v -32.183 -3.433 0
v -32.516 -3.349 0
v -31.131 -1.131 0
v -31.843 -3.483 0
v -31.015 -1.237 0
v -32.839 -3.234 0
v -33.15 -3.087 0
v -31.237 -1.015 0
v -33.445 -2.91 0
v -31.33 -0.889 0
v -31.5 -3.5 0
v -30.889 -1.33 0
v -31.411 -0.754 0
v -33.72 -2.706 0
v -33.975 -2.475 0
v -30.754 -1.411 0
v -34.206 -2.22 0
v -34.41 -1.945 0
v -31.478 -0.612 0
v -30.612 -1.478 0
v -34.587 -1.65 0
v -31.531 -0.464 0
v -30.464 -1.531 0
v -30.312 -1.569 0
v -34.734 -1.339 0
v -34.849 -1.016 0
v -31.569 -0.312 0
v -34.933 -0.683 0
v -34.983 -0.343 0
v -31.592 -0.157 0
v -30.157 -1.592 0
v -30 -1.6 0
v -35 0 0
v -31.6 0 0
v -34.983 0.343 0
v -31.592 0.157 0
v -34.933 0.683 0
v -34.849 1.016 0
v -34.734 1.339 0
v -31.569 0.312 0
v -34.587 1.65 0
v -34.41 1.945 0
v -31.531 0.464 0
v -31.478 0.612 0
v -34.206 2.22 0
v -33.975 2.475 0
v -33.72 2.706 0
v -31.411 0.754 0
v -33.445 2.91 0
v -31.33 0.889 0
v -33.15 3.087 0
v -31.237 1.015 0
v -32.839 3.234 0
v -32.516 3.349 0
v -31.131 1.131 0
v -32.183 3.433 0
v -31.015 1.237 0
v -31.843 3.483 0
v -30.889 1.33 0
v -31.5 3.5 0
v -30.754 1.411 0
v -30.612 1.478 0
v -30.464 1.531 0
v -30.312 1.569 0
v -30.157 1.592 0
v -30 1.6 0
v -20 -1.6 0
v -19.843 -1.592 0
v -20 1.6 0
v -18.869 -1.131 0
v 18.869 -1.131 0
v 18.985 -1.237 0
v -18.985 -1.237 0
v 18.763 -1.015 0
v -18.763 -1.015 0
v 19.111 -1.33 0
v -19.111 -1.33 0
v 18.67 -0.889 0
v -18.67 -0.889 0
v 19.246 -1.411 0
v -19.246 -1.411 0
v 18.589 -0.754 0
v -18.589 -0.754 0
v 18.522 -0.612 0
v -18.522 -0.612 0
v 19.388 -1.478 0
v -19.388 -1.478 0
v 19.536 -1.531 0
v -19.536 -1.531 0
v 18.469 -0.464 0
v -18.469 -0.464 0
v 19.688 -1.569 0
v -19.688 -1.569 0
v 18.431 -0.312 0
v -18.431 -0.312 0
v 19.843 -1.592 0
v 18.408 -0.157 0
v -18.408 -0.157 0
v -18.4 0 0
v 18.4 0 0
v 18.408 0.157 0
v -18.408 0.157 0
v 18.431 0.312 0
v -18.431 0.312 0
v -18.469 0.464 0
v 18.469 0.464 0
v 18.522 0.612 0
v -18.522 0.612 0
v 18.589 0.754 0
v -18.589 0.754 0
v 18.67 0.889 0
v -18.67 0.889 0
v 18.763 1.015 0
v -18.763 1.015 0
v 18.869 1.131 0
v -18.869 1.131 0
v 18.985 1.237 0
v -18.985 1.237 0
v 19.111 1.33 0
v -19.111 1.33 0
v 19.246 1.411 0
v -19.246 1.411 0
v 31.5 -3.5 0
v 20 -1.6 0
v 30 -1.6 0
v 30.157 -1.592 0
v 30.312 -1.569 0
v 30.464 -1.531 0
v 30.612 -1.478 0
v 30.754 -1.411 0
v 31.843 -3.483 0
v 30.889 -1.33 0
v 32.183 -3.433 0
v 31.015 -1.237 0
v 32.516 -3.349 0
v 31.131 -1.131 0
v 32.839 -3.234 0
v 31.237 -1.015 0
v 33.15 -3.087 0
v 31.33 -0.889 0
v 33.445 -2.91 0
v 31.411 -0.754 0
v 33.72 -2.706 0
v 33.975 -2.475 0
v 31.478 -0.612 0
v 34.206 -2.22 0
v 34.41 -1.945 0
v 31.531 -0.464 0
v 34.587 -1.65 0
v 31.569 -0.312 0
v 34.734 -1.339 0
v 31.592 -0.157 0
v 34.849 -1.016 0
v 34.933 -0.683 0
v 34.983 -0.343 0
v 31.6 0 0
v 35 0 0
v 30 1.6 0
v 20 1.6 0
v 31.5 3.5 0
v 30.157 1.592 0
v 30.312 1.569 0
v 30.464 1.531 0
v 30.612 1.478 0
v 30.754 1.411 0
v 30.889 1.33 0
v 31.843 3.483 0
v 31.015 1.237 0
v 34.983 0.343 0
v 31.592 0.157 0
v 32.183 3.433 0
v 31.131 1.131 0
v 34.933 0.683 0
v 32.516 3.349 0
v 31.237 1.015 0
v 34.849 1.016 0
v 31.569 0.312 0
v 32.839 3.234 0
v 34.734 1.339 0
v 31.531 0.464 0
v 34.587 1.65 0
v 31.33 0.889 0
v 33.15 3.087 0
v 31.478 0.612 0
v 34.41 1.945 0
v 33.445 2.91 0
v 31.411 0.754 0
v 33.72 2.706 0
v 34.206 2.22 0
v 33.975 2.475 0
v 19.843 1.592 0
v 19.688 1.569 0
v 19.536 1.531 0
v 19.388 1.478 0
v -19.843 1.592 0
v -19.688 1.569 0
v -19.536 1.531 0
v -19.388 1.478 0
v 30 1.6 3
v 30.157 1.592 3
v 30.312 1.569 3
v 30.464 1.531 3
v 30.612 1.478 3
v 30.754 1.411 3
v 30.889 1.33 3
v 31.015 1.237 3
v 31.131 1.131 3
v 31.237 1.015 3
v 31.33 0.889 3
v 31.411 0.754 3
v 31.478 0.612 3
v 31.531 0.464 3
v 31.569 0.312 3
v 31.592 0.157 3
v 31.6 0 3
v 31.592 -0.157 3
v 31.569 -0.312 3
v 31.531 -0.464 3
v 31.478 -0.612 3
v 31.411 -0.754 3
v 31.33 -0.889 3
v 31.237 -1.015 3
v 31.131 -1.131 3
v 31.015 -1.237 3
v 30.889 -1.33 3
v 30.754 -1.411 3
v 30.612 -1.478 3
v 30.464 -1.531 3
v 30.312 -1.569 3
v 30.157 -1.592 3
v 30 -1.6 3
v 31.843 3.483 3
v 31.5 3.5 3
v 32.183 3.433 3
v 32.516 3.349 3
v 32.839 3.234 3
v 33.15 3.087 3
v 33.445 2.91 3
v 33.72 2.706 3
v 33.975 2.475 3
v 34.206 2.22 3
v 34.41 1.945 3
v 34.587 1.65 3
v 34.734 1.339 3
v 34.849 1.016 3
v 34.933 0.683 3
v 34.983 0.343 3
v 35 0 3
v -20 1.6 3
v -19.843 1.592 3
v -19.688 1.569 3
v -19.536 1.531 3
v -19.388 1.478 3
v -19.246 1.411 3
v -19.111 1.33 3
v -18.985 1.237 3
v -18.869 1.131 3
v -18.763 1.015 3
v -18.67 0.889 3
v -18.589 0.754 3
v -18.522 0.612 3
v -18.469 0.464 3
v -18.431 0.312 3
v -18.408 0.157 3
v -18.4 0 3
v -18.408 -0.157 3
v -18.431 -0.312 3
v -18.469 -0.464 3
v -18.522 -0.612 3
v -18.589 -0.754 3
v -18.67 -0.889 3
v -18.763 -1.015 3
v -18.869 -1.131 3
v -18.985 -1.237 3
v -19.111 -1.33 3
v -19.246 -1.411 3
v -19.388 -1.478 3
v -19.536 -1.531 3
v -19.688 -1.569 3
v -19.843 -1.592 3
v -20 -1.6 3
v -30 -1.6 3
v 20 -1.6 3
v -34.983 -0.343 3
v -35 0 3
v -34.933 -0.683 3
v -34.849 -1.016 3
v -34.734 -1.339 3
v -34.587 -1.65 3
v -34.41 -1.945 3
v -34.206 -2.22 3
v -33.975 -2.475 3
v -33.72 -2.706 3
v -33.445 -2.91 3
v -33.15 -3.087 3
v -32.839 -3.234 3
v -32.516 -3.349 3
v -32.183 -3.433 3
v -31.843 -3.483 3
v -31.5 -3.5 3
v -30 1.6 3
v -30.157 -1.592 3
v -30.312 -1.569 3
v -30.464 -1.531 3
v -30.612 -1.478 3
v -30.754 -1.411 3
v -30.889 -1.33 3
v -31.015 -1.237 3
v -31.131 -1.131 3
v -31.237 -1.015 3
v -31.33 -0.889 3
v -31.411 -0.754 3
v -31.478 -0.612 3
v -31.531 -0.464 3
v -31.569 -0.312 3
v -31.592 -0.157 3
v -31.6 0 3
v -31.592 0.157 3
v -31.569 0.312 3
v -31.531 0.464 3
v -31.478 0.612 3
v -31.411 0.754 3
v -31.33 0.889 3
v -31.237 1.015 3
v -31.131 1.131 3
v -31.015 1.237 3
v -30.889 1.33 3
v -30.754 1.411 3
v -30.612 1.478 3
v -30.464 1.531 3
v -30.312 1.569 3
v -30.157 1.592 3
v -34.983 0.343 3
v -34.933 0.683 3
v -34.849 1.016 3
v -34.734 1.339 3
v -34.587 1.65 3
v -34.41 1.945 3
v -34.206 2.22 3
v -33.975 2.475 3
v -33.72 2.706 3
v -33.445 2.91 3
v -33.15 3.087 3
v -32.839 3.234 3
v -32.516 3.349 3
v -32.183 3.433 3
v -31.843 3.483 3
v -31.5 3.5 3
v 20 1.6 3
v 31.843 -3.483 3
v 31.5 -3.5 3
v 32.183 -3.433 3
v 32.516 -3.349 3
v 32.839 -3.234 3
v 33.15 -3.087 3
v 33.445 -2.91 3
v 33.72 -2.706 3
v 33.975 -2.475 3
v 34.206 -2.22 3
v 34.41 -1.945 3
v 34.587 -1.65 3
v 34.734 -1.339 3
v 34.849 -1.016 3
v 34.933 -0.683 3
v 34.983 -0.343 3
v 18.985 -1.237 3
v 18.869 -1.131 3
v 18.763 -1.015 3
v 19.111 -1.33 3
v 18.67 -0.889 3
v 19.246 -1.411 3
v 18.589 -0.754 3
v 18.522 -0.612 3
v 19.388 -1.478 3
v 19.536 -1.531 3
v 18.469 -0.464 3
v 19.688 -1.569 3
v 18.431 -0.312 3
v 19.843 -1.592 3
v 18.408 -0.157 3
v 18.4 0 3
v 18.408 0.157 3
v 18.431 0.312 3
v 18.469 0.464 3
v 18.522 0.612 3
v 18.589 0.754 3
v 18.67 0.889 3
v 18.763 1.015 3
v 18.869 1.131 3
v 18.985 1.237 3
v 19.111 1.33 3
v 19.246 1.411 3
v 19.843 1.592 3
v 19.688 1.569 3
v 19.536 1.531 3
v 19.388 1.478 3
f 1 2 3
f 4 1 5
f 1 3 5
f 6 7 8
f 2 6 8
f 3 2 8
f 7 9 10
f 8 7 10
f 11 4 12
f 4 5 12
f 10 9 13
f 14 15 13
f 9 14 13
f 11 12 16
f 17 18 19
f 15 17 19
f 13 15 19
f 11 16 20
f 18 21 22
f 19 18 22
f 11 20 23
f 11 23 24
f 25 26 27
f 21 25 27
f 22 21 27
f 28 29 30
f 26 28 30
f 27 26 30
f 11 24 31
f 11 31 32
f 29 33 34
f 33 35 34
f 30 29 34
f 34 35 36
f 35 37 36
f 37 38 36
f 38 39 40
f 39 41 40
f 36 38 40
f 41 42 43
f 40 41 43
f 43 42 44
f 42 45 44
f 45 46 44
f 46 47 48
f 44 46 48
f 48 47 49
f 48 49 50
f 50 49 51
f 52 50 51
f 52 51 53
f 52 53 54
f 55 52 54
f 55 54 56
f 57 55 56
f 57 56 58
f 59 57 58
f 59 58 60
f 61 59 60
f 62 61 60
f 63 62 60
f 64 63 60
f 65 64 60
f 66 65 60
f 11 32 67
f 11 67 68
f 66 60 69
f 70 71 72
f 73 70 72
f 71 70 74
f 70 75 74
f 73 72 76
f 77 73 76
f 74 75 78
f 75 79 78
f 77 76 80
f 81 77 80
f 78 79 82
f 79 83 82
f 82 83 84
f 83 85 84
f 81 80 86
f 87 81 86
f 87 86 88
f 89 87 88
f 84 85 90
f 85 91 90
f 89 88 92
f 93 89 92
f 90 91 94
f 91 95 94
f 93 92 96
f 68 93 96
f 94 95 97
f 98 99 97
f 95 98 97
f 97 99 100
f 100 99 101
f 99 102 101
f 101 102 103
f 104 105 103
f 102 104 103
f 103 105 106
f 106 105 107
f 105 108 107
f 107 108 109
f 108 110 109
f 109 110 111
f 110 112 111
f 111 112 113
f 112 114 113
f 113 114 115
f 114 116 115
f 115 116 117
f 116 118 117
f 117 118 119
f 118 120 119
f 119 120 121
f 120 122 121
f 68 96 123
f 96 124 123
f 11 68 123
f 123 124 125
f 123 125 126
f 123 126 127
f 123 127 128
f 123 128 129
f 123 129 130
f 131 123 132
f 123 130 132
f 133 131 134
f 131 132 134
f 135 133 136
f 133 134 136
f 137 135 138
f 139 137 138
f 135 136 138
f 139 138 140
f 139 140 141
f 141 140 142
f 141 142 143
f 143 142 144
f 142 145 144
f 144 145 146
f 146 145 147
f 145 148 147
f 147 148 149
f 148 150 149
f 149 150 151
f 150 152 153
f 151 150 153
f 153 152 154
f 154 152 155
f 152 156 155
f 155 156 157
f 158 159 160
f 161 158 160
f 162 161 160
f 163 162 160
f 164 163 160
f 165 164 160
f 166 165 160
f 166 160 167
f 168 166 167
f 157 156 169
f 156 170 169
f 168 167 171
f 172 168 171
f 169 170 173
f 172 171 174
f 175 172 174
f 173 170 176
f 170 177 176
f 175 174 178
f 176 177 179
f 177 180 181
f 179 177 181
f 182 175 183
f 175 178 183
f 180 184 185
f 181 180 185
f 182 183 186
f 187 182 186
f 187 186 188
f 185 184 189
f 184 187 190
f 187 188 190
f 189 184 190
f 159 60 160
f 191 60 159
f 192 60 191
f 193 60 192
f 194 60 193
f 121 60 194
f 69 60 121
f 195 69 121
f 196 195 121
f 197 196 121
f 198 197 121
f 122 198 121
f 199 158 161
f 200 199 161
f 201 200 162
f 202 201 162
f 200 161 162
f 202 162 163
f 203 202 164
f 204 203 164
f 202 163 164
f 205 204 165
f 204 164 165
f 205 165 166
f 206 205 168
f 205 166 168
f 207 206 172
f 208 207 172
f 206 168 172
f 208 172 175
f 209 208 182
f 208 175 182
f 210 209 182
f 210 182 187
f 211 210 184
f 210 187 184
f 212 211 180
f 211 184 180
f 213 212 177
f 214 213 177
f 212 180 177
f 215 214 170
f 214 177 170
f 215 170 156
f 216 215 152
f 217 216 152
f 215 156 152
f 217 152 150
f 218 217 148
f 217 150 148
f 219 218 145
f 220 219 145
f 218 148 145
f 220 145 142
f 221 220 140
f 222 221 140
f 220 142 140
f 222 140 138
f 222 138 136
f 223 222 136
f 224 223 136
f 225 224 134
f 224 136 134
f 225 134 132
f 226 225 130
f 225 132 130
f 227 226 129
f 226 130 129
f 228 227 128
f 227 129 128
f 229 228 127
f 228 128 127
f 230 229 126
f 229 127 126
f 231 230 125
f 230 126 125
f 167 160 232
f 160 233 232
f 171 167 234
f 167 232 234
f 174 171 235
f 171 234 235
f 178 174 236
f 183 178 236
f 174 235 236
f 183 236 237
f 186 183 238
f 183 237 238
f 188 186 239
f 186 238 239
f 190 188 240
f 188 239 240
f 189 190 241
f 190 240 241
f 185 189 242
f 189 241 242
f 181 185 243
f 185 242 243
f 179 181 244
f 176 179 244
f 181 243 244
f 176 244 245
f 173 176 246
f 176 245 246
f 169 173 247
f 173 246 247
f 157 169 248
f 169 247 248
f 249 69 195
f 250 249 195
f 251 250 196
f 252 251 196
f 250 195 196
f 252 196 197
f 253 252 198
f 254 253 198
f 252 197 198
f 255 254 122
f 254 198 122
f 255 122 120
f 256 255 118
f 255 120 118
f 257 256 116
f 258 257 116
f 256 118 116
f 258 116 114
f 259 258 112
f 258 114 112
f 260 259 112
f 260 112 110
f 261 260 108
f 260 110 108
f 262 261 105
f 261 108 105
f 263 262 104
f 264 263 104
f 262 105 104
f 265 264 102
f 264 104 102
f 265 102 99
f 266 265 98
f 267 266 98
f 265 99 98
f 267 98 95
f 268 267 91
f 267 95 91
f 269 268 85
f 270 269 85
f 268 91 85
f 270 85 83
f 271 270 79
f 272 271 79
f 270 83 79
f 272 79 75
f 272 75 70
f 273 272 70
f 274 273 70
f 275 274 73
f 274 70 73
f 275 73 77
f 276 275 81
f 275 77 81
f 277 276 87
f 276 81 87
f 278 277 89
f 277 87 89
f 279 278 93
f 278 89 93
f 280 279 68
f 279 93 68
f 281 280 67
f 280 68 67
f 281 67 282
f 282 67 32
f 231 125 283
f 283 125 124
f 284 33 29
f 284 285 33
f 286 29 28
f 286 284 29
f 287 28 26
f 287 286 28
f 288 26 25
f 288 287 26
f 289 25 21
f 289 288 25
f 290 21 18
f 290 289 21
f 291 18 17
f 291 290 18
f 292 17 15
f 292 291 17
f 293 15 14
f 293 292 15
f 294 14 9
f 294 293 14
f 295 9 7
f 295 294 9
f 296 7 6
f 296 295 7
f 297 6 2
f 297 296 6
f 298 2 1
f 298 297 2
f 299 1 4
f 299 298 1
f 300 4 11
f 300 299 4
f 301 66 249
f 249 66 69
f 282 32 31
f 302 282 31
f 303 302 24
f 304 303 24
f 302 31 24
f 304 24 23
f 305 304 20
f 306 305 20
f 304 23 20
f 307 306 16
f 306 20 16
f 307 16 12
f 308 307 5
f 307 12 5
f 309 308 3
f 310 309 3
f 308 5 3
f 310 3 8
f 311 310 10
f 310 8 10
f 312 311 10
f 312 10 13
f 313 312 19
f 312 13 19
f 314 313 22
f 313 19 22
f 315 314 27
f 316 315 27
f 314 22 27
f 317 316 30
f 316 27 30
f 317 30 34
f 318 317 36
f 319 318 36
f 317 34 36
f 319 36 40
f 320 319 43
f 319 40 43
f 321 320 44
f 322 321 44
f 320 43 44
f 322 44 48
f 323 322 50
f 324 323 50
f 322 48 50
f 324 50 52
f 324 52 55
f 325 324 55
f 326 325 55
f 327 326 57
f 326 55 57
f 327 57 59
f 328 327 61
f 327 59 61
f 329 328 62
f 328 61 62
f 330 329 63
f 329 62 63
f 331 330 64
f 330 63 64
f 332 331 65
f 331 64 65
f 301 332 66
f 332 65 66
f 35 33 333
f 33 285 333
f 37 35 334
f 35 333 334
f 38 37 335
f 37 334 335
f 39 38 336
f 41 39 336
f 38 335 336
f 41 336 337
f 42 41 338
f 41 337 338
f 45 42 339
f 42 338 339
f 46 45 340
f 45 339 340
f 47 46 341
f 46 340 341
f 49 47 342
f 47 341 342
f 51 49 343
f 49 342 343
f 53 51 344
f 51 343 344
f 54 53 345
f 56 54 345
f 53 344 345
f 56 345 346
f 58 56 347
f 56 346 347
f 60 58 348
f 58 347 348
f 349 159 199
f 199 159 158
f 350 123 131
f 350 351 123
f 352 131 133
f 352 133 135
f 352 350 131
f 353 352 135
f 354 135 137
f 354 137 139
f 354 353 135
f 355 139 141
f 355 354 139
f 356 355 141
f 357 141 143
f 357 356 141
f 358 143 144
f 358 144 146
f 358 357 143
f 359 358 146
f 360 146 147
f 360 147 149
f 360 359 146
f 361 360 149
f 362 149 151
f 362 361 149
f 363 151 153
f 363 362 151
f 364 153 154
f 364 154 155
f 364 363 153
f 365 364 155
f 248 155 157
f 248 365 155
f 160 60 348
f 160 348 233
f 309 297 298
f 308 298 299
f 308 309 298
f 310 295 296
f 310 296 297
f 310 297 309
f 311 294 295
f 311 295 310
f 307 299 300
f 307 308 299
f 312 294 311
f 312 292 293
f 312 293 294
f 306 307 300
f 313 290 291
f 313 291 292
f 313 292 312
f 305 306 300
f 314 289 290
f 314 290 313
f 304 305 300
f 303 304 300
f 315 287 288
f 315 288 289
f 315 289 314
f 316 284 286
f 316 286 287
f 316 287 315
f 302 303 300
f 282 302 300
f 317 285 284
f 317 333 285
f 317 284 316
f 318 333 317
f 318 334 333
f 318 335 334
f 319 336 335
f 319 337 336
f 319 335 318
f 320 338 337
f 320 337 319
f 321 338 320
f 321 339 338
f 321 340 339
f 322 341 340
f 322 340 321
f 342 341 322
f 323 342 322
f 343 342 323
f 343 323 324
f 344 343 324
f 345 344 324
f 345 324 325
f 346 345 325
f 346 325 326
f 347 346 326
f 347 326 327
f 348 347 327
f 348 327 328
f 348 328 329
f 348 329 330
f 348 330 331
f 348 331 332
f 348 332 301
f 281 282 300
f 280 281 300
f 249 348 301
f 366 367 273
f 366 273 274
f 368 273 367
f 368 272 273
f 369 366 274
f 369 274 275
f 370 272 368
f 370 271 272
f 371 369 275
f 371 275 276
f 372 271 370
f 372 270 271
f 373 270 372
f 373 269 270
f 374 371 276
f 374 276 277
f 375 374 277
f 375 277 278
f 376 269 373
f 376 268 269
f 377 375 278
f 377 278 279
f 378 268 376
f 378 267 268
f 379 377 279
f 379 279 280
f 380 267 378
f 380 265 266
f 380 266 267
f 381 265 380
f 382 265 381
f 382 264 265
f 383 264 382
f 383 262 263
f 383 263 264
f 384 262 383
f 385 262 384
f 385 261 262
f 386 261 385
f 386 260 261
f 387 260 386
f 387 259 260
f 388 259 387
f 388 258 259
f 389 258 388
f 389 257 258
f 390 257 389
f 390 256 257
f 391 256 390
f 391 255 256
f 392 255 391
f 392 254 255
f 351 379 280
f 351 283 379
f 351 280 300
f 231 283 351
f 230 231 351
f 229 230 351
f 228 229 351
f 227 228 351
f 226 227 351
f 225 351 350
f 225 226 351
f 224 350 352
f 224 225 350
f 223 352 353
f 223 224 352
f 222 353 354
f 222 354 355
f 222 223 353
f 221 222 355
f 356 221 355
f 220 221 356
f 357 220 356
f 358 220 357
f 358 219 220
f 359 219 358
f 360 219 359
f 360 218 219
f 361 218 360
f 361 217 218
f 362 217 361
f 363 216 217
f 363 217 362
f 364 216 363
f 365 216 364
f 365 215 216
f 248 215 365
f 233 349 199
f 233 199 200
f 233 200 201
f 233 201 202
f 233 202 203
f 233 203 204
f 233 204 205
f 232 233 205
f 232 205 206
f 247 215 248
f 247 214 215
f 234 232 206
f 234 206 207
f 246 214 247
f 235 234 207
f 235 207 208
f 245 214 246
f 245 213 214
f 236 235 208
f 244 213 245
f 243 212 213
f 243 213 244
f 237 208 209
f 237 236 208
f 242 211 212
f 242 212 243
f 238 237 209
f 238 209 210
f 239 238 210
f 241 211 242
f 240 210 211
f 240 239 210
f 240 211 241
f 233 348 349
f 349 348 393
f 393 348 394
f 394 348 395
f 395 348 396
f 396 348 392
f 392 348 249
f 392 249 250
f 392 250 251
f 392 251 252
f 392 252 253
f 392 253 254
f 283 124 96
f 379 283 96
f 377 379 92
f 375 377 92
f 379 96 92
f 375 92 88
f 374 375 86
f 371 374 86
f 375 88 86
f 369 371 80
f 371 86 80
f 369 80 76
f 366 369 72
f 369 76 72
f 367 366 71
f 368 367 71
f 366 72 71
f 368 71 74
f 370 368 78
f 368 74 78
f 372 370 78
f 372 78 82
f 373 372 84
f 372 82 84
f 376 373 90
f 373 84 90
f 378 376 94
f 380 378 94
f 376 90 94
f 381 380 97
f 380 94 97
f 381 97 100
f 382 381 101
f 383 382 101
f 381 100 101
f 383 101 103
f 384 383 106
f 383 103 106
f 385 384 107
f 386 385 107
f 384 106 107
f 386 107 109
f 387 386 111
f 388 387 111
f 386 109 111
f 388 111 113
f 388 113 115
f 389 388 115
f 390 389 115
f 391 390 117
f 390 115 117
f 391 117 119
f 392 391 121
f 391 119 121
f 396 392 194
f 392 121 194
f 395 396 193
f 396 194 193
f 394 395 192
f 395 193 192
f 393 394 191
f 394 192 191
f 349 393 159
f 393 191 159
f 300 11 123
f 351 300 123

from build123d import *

# Parameters (mm, degrees)
F0_W     = 70
F0_H     = 7
F1_DEPTH = 3
F2_R     = 3.49999


# Not quite as in the source:
# - a fillet or chamfer is up to 0.001 mm smaller than in the source, because OpenCascade refuses the exact size


with BuildPart() as f1:
    # F0 (on Top) → F1 (new body)
    with BuildSketch(Plane.XY):
        Rectangle(F0_W, F0_H)
        with BuildLine():
            Line((-20, -1.6), (-30, -1.6))
            ThreePointArc((-30, -1.6), (-31.6, 0), (-30, 1.6))
            Line((-30, 1.6), (-20, 1.6))
            ThreePointArc((-20, 1.6), (-18.4, 0), (-20, -1.6))
        make_face(mode=Mode.SUBTRACT)
        with BuildLine():
            Line((20, 1.6), (30, 1.6))
            ThreePointArc((30, 1.6), (31.6, 0), (30, -1.6))
            Line((30, -1.6), (20, -1.6))
            ThreePointArc((20, -1.6), (18.4, 0), (20, 1.6))
        make_face(mode=Mode.SUBTRACT)
    extrude(amount=F1_DEPTH)

    # F2 (radius 3.5 in the source; OpenCascade refuses exactly that, so slightly less here)
    f2_edges = [f1.edges().sort_by_distance(p)[0] for p in [
        (-35, 3.5, 1.5),
        (-35, -3.5, 1.5),
        (35, 3.5, 1.5),
        (35, -3.5, 1.5),
    ]]
    fillet(f2_edges, radius=F2_R)


solid = f1.part
